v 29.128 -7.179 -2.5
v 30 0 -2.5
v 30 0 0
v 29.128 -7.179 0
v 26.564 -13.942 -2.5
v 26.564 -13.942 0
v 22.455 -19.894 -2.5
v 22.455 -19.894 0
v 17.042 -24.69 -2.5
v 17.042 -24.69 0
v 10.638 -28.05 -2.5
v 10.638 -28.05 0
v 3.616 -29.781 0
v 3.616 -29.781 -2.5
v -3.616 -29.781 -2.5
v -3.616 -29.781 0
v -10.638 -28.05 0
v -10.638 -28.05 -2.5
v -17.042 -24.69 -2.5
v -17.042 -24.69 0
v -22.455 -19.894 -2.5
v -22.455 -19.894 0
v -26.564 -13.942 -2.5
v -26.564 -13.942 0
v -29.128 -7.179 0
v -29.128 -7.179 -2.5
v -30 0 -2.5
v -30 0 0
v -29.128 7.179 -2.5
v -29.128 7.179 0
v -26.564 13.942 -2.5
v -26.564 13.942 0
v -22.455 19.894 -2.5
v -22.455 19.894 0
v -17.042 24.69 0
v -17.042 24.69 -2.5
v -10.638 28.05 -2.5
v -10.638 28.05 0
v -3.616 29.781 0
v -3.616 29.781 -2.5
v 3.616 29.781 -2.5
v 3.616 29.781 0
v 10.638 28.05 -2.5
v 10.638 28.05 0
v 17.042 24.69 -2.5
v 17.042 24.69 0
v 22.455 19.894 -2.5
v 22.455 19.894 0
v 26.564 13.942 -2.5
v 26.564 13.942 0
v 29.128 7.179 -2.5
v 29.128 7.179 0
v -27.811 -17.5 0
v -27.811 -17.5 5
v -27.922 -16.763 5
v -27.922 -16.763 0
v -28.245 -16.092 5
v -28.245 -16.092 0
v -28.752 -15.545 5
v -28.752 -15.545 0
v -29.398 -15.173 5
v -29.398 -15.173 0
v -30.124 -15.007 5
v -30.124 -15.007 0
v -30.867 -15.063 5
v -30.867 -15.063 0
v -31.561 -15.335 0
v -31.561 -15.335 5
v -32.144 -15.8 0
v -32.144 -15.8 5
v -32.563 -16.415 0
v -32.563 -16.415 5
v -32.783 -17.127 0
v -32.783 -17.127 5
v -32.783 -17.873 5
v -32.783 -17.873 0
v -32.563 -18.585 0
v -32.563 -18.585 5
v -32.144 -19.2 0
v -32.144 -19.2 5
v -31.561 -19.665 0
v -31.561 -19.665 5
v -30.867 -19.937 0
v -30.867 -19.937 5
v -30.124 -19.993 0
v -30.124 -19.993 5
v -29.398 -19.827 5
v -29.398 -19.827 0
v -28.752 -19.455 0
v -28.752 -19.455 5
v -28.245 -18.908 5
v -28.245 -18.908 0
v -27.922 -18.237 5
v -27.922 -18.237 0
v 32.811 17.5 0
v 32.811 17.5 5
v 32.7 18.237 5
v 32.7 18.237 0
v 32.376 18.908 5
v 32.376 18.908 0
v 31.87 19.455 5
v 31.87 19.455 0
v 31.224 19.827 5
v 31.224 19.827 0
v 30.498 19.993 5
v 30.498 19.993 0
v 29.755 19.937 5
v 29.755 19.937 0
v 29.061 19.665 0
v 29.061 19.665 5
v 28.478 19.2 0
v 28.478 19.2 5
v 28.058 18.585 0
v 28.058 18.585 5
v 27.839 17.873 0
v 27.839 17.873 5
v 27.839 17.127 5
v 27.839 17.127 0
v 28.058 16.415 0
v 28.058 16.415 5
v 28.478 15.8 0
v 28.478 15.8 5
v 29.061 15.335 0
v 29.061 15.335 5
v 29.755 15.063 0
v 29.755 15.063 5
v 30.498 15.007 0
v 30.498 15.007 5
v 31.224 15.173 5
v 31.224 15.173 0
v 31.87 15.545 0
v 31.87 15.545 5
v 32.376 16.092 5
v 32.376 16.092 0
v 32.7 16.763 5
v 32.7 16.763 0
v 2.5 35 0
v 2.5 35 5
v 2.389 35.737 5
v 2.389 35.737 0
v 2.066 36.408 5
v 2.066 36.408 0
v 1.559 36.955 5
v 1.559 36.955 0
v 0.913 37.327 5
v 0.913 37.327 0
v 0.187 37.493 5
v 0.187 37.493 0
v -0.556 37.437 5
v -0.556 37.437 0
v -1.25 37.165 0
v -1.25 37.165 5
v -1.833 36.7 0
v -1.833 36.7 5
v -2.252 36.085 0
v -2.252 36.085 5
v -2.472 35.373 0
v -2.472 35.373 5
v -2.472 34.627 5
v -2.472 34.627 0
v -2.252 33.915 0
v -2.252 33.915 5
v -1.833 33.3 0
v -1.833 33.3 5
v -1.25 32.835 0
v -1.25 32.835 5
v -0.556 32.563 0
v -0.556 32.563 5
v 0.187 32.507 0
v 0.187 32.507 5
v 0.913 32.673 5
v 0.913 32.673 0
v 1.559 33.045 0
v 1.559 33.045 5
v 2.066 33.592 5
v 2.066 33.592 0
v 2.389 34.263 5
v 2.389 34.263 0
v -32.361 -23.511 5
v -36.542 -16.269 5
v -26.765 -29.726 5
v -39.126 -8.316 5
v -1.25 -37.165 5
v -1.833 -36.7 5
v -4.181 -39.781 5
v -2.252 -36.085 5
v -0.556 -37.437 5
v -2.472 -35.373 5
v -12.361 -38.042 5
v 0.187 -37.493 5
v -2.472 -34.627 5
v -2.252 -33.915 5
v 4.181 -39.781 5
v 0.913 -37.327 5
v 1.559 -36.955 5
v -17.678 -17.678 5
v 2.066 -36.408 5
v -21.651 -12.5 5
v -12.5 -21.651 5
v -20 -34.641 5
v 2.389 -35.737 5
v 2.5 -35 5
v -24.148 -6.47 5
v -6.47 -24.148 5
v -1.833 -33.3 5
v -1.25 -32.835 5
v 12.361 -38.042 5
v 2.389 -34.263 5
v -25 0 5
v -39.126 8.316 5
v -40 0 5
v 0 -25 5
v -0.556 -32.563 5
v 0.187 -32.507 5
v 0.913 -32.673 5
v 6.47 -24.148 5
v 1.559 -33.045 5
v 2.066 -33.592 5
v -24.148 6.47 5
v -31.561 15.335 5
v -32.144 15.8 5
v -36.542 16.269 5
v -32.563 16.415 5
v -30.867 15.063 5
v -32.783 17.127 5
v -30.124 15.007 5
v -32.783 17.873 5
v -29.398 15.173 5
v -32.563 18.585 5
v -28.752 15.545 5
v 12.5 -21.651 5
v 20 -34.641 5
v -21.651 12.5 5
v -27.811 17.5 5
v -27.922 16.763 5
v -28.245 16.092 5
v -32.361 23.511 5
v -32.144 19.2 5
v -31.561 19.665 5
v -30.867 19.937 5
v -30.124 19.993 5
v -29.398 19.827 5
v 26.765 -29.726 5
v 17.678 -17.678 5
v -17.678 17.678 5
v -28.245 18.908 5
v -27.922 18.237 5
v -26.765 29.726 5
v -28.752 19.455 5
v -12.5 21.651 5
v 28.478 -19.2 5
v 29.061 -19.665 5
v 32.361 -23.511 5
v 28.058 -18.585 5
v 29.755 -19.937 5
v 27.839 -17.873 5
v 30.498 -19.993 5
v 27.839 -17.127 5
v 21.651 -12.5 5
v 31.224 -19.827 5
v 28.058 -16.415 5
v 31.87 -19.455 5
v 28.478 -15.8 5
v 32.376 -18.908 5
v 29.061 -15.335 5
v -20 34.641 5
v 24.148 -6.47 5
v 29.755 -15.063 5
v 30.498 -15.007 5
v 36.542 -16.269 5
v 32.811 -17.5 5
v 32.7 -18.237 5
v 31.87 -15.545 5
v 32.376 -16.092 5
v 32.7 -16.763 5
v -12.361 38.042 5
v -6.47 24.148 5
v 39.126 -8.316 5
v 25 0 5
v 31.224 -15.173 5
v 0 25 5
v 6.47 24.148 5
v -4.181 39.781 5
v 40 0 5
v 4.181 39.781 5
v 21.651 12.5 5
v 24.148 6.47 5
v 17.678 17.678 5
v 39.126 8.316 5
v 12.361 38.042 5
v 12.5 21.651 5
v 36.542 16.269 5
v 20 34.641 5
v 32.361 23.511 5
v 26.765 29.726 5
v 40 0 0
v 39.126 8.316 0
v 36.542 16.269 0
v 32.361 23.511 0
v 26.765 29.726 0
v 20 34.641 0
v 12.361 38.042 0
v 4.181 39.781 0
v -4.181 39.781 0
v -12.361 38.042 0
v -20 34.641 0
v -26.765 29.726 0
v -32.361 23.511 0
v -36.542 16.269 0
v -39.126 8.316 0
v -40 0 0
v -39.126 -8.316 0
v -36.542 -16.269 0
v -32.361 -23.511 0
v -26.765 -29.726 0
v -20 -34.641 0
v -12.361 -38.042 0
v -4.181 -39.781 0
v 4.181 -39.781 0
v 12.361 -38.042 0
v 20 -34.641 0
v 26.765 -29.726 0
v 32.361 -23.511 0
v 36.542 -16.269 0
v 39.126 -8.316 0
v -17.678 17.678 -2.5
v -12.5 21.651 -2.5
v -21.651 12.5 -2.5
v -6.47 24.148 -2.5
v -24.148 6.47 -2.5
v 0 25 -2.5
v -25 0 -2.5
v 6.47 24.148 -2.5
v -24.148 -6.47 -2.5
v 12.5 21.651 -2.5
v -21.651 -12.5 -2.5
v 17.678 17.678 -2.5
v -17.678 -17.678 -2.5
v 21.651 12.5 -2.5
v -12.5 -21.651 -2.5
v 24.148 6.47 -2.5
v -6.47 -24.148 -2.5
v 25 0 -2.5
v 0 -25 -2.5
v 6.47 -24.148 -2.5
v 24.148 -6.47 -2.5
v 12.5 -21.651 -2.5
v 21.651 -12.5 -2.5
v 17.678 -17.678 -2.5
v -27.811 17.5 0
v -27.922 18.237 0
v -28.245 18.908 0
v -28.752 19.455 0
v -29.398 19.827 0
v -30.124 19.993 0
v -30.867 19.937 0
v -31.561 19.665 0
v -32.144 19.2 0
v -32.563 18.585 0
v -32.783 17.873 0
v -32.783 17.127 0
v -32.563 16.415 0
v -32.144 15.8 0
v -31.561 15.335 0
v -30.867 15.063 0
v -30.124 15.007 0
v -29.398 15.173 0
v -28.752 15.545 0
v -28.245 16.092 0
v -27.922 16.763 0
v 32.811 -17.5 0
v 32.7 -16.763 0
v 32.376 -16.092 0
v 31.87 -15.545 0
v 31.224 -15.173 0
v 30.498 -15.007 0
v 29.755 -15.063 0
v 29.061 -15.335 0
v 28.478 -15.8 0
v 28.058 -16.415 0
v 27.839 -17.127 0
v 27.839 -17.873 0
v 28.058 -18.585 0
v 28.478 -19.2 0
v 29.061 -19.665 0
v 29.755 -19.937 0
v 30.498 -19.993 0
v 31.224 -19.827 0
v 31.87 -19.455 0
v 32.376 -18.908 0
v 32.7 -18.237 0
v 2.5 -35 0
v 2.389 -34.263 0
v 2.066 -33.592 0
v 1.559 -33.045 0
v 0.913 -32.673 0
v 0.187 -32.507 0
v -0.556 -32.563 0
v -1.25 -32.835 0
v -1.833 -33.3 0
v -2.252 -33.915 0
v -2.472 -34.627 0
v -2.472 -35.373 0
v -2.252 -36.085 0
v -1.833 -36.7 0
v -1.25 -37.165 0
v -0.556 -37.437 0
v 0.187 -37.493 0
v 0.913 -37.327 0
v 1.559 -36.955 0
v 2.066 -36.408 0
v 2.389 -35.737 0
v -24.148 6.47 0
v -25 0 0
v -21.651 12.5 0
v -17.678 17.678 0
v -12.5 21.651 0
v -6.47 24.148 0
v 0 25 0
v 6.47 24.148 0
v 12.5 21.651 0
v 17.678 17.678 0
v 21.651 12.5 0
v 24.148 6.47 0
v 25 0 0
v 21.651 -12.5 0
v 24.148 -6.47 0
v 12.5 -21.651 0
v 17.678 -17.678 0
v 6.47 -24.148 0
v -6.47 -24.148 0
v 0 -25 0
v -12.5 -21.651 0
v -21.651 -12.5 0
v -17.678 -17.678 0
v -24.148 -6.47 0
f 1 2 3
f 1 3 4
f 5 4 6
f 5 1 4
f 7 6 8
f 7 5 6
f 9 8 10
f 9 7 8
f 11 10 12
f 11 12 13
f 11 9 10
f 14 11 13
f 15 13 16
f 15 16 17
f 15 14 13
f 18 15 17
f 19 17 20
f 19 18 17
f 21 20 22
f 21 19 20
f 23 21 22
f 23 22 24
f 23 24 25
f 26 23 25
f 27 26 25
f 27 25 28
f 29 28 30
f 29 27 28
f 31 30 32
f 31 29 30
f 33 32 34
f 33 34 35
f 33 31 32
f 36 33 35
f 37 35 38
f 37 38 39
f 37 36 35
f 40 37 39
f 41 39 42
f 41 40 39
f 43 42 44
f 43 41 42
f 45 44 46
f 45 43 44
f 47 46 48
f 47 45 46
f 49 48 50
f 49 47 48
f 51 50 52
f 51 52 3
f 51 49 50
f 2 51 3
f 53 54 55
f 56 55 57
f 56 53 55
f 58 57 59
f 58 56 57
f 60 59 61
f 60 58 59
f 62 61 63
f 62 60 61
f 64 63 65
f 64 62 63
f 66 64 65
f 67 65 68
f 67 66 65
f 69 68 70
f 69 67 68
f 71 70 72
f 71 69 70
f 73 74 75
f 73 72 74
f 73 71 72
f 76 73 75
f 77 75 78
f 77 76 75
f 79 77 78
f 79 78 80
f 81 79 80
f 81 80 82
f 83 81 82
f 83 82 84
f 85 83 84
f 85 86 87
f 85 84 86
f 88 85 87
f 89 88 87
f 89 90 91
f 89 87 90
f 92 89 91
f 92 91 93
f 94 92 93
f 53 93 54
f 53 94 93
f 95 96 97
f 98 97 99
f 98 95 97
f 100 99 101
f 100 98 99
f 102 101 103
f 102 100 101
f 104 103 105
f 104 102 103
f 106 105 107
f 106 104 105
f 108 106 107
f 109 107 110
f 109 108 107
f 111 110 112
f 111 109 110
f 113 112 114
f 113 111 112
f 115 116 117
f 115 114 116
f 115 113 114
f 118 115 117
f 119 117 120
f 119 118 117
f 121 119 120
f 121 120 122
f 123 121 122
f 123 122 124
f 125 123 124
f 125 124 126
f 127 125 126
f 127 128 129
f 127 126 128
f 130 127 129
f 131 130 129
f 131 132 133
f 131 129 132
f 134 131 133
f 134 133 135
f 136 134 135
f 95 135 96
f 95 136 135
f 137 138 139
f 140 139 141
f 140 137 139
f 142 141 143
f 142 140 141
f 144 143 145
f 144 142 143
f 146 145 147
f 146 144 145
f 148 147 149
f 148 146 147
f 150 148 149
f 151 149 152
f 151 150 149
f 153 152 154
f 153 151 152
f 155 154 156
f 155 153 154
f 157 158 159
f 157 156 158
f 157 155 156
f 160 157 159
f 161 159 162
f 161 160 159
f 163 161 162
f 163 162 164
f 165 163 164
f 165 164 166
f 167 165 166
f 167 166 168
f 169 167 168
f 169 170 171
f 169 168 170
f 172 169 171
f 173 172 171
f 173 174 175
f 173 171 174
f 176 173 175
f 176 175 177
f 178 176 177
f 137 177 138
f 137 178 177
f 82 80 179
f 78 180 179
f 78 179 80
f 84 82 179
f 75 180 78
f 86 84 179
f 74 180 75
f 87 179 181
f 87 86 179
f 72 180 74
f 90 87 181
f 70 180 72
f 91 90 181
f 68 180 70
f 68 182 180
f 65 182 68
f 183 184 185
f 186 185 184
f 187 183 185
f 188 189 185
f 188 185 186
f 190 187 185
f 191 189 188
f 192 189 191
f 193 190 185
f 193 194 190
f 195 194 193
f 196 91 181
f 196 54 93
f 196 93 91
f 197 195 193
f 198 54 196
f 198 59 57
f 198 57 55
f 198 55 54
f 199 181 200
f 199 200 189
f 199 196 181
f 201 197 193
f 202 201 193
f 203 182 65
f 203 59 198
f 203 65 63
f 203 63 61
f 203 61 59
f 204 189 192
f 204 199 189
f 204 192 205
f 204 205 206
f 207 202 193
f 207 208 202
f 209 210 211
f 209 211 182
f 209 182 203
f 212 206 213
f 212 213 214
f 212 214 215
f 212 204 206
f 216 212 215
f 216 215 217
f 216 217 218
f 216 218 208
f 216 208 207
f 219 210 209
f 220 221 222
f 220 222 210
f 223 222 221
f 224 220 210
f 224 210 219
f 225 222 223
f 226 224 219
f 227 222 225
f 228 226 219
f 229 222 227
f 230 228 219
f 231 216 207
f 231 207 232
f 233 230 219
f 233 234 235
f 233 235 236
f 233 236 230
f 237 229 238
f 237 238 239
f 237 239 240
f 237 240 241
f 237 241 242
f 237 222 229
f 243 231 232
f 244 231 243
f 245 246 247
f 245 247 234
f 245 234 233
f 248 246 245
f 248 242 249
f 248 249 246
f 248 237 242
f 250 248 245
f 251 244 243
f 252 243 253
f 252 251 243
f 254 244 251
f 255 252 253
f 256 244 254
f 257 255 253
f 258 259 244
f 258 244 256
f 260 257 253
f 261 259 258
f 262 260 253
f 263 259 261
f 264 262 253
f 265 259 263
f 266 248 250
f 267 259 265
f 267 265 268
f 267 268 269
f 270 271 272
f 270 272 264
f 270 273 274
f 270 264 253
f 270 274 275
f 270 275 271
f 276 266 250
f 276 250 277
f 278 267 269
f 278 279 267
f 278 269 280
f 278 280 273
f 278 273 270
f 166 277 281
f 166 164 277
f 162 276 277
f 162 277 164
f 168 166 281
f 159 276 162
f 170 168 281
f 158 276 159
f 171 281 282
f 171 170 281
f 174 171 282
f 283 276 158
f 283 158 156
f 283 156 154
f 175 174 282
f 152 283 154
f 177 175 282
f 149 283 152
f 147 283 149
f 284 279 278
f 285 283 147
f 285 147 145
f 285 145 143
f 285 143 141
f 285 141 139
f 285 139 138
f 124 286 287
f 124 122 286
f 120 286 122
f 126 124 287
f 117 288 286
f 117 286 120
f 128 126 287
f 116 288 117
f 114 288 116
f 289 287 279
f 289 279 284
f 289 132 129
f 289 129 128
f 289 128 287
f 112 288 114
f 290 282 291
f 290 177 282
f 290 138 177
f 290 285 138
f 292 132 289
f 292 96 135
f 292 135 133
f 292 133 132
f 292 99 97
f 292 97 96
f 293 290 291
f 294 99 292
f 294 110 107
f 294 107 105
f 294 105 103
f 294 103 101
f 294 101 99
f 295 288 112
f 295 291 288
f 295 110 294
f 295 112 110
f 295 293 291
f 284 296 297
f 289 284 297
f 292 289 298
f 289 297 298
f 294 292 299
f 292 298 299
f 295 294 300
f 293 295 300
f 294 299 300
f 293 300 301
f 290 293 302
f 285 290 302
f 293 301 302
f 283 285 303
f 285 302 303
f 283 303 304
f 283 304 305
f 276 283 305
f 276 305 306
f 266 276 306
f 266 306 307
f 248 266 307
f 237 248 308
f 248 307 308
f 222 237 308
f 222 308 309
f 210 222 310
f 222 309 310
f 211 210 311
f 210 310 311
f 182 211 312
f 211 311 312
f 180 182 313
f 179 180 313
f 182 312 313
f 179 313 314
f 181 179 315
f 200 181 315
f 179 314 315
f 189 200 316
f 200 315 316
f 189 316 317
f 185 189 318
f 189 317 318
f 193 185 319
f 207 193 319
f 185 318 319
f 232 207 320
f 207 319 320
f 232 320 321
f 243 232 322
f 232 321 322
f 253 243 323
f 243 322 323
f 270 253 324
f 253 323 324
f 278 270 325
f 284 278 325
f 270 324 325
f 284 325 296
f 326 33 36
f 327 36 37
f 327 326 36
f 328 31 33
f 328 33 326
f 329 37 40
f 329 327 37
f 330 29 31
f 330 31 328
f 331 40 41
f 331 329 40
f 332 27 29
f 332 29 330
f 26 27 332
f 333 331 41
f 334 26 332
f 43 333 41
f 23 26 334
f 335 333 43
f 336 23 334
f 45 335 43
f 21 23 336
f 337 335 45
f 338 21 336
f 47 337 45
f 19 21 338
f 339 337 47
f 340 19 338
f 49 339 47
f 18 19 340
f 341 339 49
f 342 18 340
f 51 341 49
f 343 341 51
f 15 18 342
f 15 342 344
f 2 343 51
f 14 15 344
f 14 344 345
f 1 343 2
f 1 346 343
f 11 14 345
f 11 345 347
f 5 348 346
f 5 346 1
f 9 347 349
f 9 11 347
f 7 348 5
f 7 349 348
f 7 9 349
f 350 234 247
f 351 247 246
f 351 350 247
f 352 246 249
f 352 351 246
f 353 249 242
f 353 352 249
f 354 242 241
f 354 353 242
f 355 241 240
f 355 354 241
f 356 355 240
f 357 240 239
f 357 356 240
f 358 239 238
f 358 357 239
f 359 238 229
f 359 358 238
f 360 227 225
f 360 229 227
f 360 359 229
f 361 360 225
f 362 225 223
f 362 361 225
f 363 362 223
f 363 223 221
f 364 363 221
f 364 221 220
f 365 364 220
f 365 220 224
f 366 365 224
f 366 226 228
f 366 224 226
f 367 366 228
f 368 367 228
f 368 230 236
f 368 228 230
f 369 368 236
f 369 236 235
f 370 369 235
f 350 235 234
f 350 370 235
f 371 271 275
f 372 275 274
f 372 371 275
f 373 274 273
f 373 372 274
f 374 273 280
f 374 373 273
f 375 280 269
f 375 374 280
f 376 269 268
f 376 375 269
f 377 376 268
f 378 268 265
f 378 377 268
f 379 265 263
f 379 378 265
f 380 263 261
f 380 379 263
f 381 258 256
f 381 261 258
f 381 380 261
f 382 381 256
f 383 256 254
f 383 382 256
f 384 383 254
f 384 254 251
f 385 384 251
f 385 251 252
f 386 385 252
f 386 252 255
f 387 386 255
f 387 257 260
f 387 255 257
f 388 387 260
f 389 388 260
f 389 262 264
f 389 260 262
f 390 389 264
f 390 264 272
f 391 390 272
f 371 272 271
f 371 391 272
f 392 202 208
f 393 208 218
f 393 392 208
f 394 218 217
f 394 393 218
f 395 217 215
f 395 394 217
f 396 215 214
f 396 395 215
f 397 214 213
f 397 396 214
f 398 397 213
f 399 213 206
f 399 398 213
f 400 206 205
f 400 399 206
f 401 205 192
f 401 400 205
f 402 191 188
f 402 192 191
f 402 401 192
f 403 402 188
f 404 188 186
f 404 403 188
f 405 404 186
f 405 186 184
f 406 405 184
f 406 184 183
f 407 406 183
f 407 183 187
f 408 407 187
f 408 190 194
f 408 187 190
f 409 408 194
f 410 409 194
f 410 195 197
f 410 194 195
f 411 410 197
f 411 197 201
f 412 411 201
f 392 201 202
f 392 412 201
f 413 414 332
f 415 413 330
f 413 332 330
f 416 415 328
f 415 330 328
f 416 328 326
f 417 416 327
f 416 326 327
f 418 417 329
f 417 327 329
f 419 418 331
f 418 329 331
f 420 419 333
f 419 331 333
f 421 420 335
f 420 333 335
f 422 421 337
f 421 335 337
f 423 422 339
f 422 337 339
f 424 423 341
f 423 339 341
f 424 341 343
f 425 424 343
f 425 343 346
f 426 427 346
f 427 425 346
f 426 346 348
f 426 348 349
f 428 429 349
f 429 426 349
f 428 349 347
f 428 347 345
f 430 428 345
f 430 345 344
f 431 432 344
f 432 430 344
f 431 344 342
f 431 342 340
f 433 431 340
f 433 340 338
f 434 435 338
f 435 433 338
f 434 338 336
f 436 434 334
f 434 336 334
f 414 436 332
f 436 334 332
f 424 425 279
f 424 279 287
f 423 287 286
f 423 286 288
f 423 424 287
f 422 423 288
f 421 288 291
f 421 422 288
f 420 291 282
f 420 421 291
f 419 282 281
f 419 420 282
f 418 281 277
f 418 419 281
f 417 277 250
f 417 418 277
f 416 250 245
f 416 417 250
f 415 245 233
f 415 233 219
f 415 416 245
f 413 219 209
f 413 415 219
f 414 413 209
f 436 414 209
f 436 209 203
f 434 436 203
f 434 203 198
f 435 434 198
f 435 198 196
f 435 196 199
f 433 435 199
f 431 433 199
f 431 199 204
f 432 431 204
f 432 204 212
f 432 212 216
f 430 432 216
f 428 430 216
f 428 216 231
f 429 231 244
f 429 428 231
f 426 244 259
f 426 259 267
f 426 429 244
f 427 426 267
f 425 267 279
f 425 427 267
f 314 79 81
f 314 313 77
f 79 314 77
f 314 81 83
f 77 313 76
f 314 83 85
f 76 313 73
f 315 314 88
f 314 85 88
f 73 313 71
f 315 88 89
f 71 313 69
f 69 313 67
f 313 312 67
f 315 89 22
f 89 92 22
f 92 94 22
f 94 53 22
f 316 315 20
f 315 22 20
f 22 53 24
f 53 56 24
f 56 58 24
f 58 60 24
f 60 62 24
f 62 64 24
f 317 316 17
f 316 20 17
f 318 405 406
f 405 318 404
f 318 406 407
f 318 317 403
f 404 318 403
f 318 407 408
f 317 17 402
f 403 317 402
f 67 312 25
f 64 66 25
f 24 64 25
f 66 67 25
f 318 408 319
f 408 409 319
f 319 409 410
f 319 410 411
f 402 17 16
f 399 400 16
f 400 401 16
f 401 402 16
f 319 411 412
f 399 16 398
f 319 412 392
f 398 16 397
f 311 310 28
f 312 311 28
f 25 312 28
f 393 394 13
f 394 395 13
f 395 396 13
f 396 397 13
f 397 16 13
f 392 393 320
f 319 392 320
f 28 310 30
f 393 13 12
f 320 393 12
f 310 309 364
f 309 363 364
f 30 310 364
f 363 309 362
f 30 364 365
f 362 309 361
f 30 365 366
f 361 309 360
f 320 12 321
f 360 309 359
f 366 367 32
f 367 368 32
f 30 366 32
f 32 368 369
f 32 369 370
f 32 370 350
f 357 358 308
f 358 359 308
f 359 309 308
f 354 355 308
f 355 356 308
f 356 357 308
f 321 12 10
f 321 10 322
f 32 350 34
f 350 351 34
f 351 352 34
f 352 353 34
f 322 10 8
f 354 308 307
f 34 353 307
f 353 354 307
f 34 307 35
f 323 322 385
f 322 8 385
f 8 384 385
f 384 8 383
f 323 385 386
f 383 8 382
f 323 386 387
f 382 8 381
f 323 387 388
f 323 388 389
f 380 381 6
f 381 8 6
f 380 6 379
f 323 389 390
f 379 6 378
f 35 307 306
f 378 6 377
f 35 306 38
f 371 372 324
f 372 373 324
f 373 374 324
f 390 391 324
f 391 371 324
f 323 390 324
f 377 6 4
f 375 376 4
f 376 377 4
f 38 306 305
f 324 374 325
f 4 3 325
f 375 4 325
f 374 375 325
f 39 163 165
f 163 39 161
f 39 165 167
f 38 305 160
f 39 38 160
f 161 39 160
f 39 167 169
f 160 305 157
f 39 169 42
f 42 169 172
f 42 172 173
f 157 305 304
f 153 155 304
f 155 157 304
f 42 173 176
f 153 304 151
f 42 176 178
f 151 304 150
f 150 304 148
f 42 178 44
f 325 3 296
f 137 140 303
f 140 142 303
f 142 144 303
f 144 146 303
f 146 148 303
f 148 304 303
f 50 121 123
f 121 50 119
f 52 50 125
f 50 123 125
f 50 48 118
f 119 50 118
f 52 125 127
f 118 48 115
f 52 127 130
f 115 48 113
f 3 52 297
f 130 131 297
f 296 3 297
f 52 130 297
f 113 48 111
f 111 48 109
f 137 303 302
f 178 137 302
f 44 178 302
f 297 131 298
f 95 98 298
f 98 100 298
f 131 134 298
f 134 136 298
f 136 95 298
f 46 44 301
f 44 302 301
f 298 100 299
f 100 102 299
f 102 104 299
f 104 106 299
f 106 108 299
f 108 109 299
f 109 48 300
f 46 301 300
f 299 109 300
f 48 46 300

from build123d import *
from build123d.topology import SkipClean

# Parameters (mm, degrees)
SKETCH1_R              = 40
SKETCH1_R_2            = 25
BOSS_EXTRUDE1_DEPTH    = 5
SLEW_START             = 2.5
SKETCH3_R              = 30
SKETCH3_R_2            = 25
SLEW_BEARING_LIP_DEPTH = 2.5
SKETCH4_R              = 2.5
SCREW_HOLES_DEPTH      = 57.789083458


with BuildPart() as part:
    # Sketch1 → Boss-Extrude1 (new body)
    with BuildSketch(Plane.XY):
        Circle(SKETCH1_R)
        Circle(SKETCH1_R_2, mode=Mode.SUBTRACT)
    extrude(amount=BOSS_EXTRUDE1_DEPTH)

    # Sketch3 → slew bearing lip (add)
    with SkipClean():  # the faces are left unmerged after this step: merging them gives an invalid solid
        with BuildSketch(Plane(origin=(0, 0, 0), x_dir=(-1, 0, 0), z_dir=(0, 0, -1)).offset(SLEW_START)):
            with Locations(Location((0, 0, 0), (0, 0, 180))):
                Circle(SKETCH3_R)
            Circle(SKETCH3_R_2, mode=Mode.SUBTRACT)
        extrude(amount=-SLEW_BEARING_LIP_DEPTH)

    # Sketch4 → screw holes (cut, through all)
    with SkipClean():  # the faces are left unmerged after this step: merging them gives an invalid solid
        with BuildSketch(Plane.XY):
            with Locations((0, 35)):
                Circle(SKETCH4_R)
            with Locations((30.310889132, 17.5)):
                Circle(SKETCH4_R)
            with Locations((30.310889132, -17.5)):
                Circle(SKETCH4_R)
            with Locations((0, -35)):
                Circle(SKETCH4_R)
            with Locations((-30.310889132, -17.5)):
                Circle(SKETCH4_R)
            with Locations((-30.310889132, 17.5)):
                Circle(SKETCH4_R)
        extrude(amount=SCREW_HOLES_DEPTH, mode=Mode.SUBTRACT)


solid = part.part
